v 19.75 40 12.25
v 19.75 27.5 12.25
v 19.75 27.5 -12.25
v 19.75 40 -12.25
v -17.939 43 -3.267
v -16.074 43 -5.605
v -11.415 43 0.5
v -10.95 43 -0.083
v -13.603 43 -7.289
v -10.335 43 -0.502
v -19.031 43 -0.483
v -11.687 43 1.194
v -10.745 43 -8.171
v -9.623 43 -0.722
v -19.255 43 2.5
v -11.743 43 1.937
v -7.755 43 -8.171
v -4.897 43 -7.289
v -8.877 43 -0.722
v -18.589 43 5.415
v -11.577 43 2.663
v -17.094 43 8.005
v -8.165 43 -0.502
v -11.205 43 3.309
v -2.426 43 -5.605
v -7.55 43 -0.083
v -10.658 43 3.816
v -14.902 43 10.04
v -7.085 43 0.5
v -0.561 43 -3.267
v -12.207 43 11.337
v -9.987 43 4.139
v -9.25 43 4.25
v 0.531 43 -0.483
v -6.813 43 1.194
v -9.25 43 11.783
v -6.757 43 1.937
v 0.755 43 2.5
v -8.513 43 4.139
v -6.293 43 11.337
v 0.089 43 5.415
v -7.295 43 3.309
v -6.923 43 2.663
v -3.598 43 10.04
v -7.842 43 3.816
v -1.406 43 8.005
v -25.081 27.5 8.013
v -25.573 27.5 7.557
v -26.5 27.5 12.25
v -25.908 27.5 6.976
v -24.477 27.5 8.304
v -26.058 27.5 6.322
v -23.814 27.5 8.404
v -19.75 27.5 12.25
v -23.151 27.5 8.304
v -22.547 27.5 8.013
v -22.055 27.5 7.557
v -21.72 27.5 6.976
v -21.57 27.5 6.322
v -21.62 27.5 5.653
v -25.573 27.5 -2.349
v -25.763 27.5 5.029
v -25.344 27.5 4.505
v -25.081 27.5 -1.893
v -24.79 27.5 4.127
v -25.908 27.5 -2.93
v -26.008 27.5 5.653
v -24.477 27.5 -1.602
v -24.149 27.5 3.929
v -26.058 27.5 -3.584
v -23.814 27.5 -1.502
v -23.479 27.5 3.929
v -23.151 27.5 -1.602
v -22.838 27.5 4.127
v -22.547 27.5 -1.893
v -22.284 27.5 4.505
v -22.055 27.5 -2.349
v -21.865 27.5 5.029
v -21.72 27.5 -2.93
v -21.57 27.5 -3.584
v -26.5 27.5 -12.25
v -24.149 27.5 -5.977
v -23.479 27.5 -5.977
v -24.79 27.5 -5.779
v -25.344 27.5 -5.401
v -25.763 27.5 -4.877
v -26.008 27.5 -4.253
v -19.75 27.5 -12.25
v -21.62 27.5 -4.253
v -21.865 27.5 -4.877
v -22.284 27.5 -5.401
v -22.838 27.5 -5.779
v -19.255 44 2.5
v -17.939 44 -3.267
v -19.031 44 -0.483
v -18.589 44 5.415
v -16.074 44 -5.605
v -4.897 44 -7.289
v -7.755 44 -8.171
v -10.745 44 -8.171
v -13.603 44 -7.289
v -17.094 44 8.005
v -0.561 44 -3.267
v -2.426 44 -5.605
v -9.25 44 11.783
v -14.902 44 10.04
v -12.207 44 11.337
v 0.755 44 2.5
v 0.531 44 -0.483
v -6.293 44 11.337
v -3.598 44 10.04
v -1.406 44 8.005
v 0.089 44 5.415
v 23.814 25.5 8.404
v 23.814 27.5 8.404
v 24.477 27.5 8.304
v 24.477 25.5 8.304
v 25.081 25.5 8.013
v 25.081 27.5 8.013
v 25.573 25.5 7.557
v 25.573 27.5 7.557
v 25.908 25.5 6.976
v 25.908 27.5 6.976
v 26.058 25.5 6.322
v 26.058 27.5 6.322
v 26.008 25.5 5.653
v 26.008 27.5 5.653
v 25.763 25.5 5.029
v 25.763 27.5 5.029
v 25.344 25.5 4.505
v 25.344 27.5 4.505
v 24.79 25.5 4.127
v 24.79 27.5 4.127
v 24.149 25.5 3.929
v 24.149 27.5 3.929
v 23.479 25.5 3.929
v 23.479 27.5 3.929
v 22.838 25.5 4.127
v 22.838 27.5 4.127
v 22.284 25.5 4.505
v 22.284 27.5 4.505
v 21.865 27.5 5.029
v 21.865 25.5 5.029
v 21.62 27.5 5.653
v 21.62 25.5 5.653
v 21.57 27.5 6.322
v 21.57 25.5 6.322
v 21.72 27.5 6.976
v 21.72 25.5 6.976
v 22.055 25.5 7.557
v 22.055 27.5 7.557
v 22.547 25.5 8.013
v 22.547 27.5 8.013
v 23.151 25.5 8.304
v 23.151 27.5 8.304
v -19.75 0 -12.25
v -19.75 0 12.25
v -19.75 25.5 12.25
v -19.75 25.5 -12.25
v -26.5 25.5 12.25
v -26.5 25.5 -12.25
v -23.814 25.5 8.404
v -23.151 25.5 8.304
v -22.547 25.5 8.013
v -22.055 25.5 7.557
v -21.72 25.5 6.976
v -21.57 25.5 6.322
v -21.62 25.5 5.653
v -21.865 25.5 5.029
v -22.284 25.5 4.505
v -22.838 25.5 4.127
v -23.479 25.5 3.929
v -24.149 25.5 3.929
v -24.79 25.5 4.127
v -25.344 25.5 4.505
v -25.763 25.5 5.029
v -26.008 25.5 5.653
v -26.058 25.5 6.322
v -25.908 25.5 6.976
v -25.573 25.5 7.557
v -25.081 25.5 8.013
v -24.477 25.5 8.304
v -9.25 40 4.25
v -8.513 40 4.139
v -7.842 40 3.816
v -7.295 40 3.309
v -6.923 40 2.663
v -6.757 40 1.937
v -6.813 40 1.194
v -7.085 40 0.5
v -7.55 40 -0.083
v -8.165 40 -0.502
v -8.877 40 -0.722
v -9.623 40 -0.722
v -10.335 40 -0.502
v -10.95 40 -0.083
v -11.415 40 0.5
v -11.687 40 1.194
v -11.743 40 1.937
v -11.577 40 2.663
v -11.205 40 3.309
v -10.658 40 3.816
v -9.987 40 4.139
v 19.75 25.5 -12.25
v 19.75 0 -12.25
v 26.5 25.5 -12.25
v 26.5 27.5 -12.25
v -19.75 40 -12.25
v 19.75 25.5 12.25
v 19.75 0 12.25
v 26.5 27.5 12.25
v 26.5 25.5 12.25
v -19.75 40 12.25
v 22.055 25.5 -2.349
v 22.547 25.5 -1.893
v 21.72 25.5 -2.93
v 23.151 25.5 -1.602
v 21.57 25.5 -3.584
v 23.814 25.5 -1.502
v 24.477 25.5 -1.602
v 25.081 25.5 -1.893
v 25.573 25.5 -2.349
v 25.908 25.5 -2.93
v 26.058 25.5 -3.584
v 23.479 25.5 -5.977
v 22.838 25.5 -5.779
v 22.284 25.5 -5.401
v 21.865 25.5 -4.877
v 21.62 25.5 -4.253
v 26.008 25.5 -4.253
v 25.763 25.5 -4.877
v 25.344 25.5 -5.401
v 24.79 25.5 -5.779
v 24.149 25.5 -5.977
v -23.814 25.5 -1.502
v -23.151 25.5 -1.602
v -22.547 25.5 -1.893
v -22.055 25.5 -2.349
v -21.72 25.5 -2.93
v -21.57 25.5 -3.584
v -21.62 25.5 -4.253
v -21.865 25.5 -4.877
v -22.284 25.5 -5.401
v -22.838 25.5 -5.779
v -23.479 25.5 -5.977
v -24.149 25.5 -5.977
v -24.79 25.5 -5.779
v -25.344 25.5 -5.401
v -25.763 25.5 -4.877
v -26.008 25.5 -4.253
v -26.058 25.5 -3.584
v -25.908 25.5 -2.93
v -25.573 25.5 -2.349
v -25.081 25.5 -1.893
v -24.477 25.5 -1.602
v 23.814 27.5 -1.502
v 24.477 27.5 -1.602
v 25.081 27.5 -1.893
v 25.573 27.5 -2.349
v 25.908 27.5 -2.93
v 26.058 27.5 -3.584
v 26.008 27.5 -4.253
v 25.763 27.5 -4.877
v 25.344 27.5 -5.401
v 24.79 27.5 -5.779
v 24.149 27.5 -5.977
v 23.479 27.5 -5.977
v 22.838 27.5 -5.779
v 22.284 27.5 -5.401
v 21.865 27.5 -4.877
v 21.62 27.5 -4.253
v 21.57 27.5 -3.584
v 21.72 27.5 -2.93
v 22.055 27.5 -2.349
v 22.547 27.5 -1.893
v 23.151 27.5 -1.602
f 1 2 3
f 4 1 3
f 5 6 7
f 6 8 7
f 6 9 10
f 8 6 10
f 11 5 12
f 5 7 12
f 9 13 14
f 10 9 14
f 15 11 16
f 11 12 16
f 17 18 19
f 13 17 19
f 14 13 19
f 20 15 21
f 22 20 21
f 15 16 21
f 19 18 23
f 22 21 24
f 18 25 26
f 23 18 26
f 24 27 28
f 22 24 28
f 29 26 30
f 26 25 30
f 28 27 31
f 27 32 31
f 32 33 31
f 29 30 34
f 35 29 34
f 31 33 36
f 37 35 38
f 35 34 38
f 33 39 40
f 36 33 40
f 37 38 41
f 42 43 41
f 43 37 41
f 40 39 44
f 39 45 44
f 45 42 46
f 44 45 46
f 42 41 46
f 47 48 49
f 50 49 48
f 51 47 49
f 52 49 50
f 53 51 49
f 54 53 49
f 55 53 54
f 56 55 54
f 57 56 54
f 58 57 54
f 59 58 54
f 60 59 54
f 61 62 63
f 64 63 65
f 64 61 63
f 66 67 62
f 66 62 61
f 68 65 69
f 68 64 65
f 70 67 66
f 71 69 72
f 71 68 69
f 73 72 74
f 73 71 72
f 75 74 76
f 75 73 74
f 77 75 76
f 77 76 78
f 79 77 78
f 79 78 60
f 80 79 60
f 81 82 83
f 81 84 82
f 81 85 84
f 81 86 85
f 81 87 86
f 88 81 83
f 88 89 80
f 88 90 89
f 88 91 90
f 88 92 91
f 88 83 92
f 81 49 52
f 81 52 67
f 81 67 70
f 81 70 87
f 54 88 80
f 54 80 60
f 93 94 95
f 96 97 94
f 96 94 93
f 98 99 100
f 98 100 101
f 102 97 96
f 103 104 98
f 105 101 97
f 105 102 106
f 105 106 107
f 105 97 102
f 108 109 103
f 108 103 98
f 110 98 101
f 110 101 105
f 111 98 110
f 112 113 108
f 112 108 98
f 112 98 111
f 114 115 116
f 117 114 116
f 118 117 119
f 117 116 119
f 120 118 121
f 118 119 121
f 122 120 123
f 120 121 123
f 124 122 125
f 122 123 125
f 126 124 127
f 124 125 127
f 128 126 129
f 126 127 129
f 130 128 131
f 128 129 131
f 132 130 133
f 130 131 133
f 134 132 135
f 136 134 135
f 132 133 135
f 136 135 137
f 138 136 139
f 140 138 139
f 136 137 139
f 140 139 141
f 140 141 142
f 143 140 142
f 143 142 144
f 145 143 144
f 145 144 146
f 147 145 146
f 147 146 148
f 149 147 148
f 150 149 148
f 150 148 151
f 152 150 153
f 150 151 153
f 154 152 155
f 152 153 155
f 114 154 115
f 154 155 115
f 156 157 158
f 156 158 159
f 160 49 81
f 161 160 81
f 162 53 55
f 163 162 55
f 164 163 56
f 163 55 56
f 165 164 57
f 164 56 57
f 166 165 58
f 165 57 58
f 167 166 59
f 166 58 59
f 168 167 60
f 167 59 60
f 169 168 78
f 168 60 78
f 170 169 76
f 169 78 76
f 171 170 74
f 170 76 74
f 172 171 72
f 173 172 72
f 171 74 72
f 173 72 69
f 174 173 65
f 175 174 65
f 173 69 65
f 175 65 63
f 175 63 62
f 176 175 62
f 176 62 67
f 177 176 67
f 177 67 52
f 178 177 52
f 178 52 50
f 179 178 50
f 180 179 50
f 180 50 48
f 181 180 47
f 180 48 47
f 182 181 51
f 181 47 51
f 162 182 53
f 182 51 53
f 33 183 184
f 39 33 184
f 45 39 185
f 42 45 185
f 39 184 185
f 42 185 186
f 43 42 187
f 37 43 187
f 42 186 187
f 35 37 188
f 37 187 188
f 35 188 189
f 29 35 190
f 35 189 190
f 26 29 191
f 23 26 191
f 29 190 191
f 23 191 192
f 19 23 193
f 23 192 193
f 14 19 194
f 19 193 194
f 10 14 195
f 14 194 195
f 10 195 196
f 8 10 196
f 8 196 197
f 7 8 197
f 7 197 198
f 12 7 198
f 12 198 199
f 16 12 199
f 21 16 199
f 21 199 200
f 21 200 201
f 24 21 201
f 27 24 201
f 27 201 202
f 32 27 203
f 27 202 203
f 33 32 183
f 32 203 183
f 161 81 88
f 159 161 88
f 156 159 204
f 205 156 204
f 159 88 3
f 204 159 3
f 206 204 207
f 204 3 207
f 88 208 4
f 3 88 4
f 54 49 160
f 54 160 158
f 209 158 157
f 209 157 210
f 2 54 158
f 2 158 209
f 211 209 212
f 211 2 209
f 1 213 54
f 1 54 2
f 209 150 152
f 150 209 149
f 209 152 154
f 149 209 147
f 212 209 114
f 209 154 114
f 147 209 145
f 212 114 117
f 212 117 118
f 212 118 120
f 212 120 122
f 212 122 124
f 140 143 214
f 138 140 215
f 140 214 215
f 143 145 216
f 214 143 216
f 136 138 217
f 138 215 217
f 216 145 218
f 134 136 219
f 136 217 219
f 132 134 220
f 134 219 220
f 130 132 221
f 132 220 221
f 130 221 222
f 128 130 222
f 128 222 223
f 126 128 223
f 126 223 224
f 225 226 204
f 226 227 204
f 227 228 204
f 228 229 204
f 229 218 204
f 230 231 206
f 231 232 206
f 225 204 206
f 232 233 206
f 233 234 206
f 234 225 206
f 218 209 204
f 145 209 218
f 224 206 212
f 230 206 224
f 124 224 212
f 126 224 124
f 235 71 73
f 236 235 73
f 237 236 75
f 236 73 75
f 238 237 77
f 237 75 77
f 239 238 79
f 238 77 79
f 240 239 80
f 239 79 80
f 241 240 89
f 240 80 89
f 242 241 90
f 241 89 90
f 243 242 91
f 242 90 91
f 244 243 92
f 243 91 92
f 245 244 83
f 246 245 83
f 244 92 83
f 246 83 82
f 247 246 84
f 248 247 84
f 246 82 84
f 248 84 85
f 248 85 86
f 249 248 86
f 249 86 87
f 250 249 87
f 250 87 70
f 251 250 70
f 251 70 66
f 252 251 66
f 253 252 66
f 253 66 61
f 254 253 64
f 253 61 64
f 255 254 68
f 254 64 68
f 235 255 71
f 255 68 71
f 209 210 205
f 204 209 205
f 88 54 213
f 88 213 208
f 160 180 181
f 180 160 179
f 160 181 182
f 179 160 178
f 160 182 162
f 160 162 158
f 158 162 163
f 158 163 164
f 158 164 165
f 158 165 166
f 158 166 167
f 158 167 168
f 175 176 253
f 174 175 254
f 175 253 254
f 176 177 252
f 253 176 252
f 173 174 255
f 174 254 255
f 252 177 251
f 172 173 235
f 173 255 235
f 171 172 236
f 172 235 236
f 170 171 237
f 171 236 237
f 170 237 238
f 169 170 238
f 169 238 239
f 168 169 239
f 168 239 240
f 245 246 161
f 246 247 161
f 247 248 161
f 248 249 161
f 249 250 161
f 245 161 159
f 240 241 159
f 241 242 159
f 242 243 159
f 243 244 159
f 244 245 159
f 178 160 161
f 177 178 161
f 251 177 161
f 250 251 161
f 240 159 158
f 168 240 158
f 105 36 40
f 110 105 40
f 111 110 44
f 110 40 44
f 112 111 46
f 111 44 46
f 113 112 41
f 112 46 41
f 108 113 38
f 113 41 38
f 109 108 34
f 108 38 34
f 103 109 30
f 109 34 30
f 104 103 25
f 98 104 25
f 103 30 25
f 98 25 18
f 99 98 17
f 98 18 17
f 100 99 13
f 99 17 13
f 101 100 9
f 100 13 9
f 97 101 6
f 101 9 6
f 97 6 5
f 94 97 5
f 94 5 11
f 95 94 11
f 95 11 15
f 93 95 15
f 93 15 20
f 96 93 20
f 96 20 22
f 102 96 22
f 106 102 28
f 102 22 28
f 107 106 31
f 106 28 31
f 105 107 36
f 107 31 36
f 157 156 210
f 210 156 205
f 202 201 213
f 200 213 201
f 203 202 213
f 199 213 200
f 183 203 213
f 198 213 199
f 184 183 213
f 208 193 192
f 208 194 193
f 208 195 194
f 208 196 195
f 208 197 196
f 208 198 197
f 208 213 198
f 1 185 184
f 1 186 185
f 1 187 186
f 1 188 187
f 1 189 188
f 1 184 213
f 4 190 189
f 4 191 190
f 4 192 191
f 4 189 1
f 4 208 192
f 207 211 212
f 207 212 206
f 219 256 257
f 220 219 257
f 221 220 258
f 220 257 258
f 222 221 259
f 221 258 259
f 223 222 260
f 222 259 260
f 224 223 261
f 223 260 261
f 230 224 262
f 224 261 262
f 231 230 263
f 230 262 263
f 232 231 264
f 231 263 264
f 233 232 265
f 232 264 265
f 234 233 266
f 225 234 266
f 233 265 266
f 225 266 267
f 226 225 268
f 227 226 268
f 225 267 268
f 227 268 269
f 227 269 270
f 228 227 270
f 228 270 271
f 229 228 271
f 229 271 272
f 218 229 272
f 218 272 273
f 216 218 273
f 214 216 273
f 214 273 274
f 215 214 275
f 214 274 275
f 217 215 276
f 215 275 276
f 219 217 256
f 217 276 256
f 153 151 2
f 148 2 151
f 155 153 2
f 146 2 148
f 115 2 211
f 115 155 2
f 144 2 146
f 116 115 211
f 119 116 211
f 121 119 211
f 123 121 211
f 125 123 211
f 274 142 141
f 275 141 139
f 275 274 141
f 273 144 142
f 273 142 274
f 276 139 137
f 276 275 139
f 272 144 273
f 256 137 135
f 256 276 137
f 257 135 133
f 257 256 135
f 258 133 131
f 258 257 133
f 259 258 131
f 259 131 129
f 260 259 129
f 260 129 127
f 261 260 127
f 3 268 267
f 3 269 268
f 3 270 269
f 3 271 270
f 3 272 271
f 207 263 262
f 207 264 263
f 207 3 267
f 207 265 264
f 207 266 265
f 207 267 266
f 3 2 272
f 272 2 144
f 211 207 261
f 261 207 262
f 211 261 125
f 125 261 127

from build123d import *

# Parameters (mm, degrees)
SKETCH1_W           = 39.5
SKETCH1_H           = 24.5
BOSS_EXTRUDE1_DEPTH = 40
SKETCH2_W           = 53
SKETCH2_H           = 24.5
BOSS_EXTRUDE2_DEPTH = 2
SKETCH3_R           = 2.25
CUT_EXTRUDE1_DEPTH  = 2
SKETCH4_R           = 2.5
BOSS_EXTRUDE3_DEPTH = 3
SKETCH5_R           = 10.033
BOSS_EXTRUDE4_DEPTH = 1


with BuildPart() as part:
    # Sketch1 → Boss-Extrude1 (new body)
    with BuildSketch(Plane(origin=(0, 0, 0), x_dir=(1, 0, 0), z_dir=(0, 1, 0))):
        Rectangle(SKETCH1_W, SKETCH1_H)
    extrude(amount=BOSS_EXTRUDE1_DEPTH)

    # Sketch2 → Boss-Extrude2 (add)
    with BuildSketch(Plane(origin=(0, 27.5, 0), x_dir=(1, 0, 0), z_dir=(0, 1, 0))):
        Rectangle(SKETCH2_W, SKETCH2_H)
    extrude(amount=-BOSS_EXTRUDE2_DEPTH)

    # Sketch3 → Cut-Extrude1 (cut)
    with BuildSketch(Plane(origin=(0, 27.5, 0), x_dir=(1, 0, 0), z_dir=(0, 1, 0))):
        with Locations(Location((-23.814, 3.752, 0), (0, 0, 270))):
            Circle(SKETCH3_R)
        with Locations(Location((-23.814, -6.154, 0), (0, 0, 270))):
            Circle(SKETCH3_R)
        with Locations(Location((23.814, 3.752, 0), (0, 0, 270))):
            Circle(SKETCH3_R)
        with Locations(Location((23.814, -6.154, 0), (0, 0, 270))):
            Circle(SKETCH3_R)
    extrude(amount=-CUT_EXTRUDE1_DEPTH, mode=Mode.SUBTRACT)

    # Sketch4 → Boss-Extrude3 (add)
    with BuildSketch(Plane(origin=(0, 40, 0), x_dir=(1, 0, 0), z_dir=(0, 1, 0))):
        with Locations(Location((-9.25, -1.75, 0), (0, 0, 270))):
            Circle(SKETCH4_R)
    extrude(amount=BOSS_EXTRUDE3_DEPTH)

    # Sketch5 → Boss-Extrude4 (add)
    with BuildSketch(Plane(origin=(0, 43, 0), x_dir=(1, 0, 0), z_dir=(0, 1, 0))):
        with Locations(Location((-9.25, -1.75, 0), (0, 0, 270))):
            Circle(SKETCH5_R)
    extrude(amount=BOSS_EXTRUDE4_DEPTH)


solid = part.part
